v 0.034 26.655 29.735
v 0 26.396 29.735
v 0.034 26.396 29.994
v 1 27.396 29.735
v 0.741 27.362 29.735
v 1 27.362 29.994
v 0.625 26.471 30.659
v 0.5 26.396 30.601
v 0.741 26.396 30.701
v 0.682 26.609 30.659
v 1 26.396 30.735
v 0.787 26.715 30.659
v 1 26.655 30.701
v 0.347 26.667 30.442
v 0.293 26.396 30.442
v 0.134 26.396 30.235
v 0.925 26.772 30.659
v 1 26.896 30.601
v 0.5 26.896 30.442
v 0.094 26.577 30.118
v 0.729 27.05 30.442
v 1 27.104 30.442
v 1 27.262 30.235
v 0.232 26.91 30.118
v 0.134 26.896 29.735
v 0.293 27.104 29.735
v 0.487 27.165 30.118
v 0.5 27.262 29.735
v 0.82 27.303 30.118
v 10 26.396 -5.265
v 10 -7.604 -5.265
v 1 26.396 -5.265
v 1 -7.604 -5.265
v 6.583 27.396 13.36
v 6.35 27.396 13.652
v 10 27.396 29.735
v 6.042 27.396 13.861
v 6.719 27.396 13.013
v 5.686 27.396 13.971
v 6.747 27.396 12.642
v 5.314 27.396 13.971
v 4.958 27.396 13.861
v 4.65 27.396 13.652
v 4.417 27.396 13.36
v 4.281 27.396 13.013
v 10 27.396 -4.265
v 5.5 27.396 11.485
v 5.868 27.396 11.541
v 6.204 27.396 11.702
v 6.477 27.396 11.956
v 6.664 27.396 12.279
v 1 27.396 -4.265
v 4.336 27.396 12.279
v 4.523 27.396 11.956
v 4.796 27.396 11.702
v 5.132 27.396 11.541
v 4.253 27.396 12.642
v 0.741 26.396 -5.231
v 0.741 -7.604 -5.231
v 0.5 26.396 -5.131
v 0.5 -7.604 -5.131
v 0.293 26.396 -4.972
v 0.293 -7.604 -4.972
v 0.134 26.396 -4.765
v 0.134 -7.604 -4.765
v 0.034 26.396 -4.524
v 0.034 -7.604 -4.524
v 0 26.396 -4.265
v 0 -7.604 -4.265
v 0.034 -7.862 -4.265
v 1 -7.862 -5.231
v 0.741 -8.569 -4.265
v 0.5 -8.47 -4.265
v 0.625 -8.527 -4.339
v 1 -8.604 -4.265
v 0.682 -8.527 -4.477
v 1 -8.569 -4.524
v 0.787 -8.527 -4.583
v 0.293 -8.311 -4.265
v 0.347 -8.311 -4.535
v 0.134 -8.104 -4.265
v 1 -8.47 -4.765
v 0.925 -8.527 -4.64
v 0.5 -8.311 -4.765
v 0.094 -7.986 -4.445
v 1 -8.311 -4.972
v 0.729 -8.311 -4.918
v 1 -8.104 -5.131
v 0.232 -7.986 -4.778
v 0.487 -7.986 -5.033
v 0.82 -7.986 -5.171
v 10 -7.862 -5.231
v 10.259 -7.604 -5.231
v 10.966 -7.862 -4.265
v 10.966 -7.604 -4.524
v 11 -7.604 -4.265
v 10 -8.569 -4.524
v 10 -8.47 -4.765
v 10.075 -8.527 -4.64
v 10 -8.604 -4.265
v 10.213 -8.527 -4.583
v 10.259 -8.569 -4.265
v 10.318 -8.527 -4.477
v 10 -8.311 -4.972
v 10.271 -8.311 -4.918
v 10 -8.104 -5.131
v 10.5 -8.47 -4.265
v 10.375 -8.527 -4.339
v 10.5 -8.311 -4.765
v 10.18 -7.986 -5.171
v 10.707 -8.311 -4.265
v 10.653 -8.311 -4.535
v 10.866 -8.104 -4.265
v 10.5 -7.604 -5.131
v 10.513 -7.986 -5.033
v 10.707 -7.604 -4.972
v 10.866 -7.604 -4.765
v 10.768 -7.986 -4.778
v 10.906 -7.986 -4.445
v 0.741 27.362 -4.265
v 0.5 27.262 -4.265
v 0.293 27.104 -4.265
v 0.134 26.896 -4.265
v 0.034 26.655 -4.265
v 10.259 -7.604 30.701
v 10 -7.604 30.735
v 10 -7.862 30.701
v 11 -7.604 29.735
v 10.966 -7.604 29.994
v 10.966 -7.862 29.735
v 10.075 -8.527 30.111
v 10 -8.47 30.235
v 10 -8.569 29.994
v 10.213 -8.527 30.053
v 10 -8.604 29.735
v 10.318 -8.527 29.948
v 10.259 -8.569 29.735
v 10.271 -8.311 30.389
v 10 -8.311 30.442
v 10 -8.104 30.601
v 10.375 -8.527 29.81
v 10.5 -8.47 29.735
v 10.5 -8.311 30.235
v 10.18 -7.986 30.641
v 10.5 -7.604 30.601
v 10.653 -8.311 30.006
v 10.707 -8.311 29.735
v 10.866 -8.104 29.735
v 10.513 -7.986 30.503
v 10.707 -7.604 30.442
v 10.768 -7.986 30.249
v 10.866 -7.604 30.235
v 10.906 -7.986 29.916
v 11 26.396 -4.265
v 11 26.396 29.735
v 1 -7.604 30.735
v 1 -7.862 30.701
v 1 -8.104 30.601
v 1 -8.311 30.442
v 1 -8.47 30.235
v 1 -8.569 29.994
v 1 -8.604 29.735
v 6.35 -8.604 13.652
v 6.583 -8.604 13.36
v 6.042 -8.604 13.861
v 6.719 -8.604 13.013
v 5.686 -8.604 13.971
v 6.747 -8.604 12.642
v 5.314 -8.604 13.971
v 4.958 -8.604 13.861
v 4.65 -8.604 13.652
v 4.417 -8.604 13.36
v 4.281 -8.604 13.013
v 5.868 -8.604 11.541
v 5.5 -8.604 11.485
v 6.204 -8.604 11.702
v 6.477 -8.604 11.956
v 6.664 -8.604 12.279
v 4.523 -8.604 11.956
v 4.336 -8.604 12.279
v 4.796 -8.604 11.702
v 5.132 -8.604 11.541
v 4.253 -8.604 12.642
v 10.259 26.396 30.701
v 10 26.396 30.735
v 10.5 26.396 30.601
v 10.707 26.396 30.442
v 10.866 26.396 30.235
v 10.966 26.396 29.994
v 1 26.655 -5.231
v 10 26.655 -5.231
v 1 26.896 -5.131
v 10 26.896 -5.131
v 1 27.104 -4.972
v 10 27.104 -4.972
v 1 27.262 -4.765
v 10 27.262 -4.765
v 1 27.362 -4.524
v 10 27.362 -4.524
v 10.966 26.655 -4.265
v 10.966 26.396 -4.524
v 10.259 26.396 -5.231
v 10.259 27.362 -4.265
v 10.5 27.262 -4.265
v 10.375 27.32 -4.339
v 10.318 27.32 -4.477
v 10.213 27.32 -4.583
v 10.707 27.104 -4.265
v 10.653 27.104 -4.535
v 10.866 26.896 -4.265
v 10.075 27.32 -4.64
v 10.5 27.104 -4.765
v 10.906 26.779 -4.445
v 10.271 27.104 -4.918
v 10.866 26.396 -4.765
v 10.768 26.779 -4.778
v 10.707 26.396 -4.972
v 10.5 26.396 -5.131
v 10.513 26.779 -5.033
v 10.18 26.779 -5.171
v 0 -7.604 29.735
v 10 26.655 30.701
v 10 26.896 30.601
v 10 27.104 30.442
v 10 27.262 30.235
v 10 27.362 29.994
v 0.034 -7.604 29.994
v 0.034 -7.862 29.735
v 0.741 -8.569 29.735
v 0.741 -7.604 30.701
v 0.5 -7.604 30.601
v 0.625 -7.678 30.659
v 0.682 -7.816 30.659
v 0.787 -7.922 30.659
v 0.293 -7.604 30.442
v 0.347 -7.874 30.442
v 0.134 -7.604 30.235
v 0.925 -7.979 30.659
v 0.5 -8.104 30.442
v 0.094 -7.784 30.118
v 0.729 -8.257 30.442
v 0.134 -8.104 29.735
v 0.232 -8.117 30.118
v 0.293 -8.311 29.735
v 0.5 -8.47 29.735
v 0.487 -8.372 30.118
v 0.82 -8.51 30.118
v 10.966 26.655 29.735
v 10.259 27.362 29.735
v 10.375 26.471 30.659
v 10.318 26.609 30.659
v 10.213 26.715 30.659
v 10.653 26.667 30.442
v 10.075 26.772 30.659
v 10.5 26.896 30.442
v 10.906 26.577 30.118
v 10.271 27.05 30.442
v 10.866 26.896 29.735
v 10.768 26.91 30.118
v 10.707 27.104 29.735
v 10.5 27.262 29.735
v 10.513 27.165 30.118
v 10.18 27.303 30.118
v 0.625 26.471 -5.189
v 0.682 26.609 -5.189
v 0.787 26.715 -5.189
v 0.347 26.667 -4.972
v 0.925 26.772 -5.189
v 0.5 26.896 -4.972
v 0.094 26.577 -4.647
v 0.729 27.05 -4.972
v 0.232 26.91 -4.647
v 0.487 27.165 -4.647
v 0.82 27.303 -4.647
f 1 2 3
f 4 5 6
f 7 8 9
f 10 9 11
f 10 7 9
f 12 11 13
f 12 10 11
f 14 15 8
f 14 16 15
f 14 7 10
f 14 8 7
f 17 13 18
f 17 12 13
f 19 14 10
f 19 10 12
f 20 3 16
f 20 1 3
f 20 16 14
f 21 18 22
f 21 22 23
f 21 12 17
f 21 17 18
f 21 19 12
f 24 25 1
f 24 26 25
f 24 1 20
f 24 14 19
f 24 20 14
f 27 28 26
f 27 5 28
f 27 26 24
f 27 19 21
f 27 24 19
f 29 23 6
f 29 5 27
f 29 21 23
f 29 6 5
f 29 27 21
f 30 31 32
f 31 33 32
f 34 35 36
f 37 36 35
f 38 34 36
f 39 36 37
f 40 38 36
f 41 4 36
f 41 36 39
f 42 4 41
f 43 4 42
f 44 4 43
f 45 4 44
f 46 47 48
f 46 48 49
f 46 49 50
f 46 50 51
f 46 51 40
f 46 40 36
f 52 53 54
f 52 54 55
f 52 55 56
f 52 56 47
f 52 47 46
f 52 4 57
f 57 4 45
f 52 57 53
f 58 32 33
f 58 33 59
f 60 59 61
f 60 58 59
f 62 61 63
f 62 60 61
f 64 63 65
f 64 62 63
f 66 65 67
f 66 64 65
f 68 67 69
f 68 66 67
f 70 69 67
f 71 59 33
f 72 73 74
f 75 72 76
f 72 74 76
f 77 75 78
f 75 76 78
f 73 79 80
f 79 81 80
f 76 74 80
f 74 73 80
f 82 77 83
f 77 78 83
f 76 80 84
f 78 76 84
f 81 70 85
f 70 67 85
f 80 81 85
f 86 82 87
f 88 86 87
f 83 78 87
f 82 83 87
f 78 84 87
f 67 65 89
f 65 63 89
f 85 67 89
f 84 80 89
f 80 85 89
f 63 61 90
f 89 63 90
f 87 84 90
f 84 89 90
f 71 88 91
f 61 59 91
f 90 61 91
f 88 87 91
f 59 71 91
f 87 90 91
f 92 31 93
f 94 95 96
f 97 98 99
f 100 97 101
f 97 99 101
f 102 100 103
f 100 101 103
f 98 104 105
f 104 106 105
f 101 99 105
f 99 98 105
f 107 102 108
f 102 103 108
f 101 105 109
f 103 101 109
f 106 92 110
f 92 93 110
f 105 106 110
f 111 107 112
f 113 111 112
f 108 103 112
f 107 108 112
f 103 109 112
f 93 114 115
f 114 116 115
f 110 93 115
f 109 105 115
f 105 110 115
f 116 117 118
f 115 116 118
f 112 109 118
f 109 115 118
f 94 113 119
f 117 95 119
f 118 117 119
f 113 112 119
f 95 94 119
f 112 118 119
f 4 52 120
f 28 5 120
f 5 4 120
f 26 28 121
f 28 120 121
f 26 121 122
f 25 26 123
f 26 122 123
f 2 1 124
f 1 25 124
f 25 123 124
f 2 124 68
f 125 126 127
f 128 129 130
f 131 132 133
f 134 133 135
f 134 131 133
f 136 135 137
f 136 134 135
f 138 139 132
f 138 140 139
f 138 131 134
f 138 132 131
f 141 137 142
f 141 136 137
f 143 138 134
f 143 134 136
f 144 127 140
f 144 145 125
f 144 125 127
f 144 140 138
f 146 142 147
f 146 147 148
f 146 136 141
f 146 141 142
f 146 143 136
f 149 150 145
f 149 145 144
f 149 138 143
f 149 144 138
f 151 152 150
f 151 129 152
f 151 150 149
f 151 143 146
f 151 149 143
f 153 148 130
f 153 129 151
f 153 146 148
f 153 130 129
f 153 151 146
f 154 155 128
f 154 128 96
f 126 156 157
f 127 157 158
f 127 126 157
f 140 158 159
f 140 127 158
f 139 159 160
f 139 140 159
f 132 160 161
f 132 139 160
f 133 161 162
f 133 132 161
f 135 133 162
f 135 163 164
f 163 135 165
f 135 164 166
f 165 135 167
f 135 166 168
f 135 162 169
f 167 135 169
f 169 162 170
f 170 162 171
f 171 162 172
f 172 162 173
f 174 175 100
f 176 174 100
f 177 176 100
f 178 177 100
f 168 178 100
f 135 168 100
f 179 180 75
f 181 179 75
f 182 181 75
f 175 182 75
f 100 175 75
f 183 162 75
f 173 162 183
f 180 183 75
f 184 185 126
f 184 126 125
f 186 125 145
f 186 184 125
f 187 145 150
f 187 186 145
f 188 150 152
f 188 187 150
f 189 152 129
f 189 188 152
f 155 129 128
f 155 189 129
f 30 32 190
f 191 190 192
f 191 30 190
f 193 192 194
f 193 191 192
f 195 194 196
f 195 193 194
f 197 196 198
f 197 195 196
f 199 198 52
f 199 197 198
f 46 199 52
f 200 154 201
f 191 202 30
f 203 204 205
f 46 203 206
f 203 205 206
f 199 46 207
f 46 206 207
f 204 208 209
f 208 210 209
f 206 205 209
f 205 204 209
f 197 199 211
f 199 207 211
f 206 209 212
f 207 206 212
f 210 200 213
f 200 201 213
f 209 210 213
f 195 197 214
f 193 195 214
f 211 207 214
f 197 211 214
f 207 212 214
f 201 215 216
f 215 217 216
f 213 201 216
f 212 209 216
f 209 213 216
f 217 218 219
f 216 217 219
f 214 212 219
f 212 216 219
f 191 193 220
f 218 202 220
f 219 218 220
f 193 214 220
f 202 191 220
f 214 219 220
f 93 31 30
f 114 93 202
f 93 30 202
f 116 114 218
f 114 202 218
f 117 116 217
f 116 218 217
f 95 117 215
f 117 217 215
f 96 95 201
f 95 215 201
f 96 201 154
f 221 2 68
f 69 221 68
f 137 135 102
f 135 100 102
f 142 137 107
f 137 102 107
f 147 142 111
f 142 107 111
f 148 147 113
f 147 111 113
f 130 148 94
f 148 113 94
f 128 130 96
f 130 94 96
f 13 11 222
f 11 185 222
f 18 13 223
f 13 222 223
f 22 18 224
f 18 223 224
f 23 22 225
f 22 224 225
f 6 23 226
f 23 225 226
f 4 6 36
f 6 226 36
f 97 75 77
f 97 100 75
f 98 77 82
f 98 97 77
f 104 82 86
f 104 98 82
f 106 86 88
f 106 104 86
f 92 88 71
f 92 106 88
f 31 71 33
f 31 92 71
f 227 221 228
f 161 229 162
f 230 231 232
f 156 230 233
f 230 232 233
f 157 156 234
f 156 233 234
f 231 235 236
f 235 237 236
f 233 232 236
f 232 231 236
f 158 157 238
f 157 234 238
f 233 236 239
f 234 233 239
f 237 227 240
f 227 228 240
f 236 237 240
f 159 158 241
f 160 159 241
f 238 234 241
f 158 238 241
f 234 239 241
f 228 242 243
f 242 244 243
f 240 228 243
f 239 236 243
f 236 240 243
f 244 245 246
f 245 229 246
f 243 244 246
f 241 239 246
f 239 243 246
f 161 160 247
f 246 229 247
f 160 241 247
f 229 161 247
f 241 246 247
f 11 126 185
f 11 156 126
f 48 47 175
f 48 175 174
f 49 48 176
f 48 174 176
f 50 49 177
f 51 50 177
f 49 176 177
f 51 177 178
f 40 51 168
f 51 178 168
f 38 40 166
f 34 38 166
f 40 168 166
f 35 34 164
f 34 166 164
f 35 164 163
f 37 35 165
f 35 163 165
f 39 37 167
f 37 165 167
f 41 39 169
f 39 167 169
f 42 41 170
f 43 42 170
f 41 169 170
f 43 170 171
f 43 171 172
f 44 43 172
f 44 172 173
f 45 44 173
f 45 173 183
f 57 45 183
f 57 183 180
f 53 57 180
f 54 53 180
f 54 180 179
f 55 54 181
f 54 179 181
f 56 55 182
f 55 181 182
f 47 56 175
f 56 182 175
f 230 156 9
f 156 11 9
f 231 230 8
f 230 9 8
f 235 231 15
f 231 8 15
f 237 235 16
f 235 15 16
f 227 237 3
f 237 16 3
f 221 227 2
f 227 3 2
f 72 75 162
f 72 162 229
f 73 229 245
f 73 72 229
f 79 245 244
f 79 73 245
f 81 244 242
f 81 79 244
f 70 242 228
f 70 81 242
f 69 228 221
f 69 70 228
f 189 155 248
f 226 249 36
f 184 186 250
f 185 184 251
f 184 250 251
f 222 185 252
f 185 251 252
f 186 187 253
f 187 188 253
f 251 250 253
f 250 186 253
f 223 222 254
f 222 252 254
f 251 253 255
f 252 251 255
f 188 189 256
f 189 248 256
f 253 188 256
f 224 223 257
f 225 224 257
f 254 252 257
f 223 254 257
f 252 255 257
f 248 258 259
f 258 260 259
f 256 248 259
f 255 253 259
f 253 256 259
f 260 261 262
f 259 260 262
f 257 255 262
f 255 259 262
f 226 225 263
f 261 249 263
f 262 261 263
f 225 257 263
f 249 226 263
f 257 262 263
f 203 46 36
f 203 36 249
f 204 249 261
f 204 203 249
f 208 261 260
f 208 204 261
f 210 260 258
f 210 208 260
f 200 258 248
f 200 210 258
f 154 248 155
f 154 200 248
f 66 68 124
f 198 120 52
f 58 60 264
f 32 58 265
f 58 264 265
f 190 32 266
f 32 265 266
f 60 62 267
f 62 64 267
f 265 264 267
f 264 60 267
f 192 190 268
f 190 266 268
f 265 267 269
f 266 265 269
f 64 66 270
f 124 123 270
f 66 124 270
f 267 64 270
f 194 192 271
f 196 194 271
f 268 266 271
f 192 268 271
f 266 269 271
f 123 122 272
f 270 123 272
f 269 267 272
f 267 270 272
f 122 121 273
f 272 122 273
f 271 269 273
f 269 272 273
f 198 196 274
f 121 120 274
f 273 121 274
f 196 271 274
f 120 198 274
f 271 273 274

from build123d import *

# Parameters (mm, degrees)
SKETCH_1_W          = 36
SKETCH_1_H          = 36
EXTRUDE_1_DEPTH     = 11
FILLET_1_R          = 1
SKETCH_2_R          = 1.25
CUT_EXTRUDE_1_DEPTH = 36


with BuildPart() as part:
    # 草图1 → 凸台-拉伸1 (new body)
    with BuildSketch(Plane(origin=(0, 0, 0), x_dir=(0, 0, -1), z_dir=(1, 0, 0))):
        with Locations((-12.735278258, 9.396435054)):
            Rectangle(SKETCH_1_W, SKETCH_1_H)
    extrude(amount=EXTRUDE_1_DEPTH)

    # 圆角1
    fillet_1_edges = [part.edges().sort_by_distance(p)[0] for p in [
        (11, 9.396435054, -5.264721742),
        (11, 27.396435054, 12.735278258),
        (11, 9.396435054, 30.735278258),
        (0, 27.396435054, 12.735278258),
        (0, 9.396435054, -5.264721742),
        (0, -8.603564946, 12.735278258),
        (0, 9.396435054, 30.735278258),
        (5.5, 27.396435054, 30.735278258),
        (5.5, 27.396435054, -5.264721742),
        (5.5, -8.603564946, -5.264721742),
        (5.5, -8.603564946, 30.735278258),
        (11, -8.603564946, 12.735278258),
    ]]
    fillet(fillet_1_edges, radius=FILLET_1_R)

    # 草图2 → 切除-拉伸1 (cut)
    with BuildSketch(Plane.XZ.offset(8.603564946)):
        with Locations(Location((5.5, 12.735278258, 0), (0, 0, 270))):
            Circle(SKETCH_2_R)
    extrude(amount=-CUT_EXTRUDE_1_DEPTH, mode=Mode.SUBTRACT)


solid = part.part
